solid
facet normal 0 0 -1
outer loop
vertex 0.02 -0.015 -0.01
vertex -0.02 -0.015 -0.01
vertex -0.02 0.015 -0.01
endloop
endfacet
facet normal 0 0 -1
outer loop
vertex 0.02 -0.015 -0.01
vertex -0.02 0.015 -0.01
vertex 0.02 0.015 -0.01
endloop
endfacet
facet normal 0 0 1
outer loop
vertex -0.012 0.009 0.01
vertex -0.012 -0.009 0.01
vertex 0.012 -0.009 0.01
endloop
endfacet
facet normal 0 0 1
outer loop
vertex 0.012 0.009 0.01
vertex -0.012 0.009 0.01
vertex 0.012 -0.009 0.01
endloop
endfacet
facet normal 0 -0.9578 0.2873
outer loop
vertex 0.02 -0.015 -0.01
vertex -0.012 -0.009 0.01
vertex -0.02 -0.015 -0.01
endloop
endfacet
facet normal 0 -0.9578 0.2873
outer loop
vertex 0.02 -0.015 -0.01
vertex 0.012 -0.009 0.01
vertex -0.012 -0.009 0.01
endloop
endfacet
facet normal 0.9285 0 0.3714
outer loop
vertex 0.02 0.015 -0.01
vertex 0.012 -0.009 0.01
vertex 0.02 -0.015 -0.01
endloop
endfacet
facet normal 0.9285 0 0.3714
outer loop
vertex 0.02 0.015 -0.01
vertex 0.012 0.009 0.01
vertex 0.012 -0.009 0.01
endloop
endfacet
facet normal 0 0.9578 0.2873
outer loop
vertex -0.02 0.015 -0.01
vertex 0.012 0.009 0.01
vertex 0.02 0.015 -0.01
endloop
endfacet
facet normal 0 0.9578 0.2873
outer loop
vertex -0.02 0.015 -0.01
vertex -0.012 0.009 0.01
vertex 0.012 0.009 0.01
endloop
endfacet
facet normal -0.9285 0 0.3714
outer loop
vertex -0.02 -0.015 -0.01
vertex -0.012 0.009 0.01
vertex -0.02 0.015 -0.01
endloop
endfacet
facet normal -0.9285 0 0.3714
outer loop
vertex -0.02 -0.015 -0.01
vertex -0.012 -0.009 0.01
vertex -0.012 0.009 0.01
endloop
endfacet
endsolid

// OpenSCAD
module Base(
    breadth = 40E-03, 
    depth = 30E-03, 
    height=20E-03, 
    scale_top=0.6, 
    center=true
    ) {
    linear_extrude(height=height, scale=scale_top, center=center)
        square([breadth, depth], center=true);
}



Base();
